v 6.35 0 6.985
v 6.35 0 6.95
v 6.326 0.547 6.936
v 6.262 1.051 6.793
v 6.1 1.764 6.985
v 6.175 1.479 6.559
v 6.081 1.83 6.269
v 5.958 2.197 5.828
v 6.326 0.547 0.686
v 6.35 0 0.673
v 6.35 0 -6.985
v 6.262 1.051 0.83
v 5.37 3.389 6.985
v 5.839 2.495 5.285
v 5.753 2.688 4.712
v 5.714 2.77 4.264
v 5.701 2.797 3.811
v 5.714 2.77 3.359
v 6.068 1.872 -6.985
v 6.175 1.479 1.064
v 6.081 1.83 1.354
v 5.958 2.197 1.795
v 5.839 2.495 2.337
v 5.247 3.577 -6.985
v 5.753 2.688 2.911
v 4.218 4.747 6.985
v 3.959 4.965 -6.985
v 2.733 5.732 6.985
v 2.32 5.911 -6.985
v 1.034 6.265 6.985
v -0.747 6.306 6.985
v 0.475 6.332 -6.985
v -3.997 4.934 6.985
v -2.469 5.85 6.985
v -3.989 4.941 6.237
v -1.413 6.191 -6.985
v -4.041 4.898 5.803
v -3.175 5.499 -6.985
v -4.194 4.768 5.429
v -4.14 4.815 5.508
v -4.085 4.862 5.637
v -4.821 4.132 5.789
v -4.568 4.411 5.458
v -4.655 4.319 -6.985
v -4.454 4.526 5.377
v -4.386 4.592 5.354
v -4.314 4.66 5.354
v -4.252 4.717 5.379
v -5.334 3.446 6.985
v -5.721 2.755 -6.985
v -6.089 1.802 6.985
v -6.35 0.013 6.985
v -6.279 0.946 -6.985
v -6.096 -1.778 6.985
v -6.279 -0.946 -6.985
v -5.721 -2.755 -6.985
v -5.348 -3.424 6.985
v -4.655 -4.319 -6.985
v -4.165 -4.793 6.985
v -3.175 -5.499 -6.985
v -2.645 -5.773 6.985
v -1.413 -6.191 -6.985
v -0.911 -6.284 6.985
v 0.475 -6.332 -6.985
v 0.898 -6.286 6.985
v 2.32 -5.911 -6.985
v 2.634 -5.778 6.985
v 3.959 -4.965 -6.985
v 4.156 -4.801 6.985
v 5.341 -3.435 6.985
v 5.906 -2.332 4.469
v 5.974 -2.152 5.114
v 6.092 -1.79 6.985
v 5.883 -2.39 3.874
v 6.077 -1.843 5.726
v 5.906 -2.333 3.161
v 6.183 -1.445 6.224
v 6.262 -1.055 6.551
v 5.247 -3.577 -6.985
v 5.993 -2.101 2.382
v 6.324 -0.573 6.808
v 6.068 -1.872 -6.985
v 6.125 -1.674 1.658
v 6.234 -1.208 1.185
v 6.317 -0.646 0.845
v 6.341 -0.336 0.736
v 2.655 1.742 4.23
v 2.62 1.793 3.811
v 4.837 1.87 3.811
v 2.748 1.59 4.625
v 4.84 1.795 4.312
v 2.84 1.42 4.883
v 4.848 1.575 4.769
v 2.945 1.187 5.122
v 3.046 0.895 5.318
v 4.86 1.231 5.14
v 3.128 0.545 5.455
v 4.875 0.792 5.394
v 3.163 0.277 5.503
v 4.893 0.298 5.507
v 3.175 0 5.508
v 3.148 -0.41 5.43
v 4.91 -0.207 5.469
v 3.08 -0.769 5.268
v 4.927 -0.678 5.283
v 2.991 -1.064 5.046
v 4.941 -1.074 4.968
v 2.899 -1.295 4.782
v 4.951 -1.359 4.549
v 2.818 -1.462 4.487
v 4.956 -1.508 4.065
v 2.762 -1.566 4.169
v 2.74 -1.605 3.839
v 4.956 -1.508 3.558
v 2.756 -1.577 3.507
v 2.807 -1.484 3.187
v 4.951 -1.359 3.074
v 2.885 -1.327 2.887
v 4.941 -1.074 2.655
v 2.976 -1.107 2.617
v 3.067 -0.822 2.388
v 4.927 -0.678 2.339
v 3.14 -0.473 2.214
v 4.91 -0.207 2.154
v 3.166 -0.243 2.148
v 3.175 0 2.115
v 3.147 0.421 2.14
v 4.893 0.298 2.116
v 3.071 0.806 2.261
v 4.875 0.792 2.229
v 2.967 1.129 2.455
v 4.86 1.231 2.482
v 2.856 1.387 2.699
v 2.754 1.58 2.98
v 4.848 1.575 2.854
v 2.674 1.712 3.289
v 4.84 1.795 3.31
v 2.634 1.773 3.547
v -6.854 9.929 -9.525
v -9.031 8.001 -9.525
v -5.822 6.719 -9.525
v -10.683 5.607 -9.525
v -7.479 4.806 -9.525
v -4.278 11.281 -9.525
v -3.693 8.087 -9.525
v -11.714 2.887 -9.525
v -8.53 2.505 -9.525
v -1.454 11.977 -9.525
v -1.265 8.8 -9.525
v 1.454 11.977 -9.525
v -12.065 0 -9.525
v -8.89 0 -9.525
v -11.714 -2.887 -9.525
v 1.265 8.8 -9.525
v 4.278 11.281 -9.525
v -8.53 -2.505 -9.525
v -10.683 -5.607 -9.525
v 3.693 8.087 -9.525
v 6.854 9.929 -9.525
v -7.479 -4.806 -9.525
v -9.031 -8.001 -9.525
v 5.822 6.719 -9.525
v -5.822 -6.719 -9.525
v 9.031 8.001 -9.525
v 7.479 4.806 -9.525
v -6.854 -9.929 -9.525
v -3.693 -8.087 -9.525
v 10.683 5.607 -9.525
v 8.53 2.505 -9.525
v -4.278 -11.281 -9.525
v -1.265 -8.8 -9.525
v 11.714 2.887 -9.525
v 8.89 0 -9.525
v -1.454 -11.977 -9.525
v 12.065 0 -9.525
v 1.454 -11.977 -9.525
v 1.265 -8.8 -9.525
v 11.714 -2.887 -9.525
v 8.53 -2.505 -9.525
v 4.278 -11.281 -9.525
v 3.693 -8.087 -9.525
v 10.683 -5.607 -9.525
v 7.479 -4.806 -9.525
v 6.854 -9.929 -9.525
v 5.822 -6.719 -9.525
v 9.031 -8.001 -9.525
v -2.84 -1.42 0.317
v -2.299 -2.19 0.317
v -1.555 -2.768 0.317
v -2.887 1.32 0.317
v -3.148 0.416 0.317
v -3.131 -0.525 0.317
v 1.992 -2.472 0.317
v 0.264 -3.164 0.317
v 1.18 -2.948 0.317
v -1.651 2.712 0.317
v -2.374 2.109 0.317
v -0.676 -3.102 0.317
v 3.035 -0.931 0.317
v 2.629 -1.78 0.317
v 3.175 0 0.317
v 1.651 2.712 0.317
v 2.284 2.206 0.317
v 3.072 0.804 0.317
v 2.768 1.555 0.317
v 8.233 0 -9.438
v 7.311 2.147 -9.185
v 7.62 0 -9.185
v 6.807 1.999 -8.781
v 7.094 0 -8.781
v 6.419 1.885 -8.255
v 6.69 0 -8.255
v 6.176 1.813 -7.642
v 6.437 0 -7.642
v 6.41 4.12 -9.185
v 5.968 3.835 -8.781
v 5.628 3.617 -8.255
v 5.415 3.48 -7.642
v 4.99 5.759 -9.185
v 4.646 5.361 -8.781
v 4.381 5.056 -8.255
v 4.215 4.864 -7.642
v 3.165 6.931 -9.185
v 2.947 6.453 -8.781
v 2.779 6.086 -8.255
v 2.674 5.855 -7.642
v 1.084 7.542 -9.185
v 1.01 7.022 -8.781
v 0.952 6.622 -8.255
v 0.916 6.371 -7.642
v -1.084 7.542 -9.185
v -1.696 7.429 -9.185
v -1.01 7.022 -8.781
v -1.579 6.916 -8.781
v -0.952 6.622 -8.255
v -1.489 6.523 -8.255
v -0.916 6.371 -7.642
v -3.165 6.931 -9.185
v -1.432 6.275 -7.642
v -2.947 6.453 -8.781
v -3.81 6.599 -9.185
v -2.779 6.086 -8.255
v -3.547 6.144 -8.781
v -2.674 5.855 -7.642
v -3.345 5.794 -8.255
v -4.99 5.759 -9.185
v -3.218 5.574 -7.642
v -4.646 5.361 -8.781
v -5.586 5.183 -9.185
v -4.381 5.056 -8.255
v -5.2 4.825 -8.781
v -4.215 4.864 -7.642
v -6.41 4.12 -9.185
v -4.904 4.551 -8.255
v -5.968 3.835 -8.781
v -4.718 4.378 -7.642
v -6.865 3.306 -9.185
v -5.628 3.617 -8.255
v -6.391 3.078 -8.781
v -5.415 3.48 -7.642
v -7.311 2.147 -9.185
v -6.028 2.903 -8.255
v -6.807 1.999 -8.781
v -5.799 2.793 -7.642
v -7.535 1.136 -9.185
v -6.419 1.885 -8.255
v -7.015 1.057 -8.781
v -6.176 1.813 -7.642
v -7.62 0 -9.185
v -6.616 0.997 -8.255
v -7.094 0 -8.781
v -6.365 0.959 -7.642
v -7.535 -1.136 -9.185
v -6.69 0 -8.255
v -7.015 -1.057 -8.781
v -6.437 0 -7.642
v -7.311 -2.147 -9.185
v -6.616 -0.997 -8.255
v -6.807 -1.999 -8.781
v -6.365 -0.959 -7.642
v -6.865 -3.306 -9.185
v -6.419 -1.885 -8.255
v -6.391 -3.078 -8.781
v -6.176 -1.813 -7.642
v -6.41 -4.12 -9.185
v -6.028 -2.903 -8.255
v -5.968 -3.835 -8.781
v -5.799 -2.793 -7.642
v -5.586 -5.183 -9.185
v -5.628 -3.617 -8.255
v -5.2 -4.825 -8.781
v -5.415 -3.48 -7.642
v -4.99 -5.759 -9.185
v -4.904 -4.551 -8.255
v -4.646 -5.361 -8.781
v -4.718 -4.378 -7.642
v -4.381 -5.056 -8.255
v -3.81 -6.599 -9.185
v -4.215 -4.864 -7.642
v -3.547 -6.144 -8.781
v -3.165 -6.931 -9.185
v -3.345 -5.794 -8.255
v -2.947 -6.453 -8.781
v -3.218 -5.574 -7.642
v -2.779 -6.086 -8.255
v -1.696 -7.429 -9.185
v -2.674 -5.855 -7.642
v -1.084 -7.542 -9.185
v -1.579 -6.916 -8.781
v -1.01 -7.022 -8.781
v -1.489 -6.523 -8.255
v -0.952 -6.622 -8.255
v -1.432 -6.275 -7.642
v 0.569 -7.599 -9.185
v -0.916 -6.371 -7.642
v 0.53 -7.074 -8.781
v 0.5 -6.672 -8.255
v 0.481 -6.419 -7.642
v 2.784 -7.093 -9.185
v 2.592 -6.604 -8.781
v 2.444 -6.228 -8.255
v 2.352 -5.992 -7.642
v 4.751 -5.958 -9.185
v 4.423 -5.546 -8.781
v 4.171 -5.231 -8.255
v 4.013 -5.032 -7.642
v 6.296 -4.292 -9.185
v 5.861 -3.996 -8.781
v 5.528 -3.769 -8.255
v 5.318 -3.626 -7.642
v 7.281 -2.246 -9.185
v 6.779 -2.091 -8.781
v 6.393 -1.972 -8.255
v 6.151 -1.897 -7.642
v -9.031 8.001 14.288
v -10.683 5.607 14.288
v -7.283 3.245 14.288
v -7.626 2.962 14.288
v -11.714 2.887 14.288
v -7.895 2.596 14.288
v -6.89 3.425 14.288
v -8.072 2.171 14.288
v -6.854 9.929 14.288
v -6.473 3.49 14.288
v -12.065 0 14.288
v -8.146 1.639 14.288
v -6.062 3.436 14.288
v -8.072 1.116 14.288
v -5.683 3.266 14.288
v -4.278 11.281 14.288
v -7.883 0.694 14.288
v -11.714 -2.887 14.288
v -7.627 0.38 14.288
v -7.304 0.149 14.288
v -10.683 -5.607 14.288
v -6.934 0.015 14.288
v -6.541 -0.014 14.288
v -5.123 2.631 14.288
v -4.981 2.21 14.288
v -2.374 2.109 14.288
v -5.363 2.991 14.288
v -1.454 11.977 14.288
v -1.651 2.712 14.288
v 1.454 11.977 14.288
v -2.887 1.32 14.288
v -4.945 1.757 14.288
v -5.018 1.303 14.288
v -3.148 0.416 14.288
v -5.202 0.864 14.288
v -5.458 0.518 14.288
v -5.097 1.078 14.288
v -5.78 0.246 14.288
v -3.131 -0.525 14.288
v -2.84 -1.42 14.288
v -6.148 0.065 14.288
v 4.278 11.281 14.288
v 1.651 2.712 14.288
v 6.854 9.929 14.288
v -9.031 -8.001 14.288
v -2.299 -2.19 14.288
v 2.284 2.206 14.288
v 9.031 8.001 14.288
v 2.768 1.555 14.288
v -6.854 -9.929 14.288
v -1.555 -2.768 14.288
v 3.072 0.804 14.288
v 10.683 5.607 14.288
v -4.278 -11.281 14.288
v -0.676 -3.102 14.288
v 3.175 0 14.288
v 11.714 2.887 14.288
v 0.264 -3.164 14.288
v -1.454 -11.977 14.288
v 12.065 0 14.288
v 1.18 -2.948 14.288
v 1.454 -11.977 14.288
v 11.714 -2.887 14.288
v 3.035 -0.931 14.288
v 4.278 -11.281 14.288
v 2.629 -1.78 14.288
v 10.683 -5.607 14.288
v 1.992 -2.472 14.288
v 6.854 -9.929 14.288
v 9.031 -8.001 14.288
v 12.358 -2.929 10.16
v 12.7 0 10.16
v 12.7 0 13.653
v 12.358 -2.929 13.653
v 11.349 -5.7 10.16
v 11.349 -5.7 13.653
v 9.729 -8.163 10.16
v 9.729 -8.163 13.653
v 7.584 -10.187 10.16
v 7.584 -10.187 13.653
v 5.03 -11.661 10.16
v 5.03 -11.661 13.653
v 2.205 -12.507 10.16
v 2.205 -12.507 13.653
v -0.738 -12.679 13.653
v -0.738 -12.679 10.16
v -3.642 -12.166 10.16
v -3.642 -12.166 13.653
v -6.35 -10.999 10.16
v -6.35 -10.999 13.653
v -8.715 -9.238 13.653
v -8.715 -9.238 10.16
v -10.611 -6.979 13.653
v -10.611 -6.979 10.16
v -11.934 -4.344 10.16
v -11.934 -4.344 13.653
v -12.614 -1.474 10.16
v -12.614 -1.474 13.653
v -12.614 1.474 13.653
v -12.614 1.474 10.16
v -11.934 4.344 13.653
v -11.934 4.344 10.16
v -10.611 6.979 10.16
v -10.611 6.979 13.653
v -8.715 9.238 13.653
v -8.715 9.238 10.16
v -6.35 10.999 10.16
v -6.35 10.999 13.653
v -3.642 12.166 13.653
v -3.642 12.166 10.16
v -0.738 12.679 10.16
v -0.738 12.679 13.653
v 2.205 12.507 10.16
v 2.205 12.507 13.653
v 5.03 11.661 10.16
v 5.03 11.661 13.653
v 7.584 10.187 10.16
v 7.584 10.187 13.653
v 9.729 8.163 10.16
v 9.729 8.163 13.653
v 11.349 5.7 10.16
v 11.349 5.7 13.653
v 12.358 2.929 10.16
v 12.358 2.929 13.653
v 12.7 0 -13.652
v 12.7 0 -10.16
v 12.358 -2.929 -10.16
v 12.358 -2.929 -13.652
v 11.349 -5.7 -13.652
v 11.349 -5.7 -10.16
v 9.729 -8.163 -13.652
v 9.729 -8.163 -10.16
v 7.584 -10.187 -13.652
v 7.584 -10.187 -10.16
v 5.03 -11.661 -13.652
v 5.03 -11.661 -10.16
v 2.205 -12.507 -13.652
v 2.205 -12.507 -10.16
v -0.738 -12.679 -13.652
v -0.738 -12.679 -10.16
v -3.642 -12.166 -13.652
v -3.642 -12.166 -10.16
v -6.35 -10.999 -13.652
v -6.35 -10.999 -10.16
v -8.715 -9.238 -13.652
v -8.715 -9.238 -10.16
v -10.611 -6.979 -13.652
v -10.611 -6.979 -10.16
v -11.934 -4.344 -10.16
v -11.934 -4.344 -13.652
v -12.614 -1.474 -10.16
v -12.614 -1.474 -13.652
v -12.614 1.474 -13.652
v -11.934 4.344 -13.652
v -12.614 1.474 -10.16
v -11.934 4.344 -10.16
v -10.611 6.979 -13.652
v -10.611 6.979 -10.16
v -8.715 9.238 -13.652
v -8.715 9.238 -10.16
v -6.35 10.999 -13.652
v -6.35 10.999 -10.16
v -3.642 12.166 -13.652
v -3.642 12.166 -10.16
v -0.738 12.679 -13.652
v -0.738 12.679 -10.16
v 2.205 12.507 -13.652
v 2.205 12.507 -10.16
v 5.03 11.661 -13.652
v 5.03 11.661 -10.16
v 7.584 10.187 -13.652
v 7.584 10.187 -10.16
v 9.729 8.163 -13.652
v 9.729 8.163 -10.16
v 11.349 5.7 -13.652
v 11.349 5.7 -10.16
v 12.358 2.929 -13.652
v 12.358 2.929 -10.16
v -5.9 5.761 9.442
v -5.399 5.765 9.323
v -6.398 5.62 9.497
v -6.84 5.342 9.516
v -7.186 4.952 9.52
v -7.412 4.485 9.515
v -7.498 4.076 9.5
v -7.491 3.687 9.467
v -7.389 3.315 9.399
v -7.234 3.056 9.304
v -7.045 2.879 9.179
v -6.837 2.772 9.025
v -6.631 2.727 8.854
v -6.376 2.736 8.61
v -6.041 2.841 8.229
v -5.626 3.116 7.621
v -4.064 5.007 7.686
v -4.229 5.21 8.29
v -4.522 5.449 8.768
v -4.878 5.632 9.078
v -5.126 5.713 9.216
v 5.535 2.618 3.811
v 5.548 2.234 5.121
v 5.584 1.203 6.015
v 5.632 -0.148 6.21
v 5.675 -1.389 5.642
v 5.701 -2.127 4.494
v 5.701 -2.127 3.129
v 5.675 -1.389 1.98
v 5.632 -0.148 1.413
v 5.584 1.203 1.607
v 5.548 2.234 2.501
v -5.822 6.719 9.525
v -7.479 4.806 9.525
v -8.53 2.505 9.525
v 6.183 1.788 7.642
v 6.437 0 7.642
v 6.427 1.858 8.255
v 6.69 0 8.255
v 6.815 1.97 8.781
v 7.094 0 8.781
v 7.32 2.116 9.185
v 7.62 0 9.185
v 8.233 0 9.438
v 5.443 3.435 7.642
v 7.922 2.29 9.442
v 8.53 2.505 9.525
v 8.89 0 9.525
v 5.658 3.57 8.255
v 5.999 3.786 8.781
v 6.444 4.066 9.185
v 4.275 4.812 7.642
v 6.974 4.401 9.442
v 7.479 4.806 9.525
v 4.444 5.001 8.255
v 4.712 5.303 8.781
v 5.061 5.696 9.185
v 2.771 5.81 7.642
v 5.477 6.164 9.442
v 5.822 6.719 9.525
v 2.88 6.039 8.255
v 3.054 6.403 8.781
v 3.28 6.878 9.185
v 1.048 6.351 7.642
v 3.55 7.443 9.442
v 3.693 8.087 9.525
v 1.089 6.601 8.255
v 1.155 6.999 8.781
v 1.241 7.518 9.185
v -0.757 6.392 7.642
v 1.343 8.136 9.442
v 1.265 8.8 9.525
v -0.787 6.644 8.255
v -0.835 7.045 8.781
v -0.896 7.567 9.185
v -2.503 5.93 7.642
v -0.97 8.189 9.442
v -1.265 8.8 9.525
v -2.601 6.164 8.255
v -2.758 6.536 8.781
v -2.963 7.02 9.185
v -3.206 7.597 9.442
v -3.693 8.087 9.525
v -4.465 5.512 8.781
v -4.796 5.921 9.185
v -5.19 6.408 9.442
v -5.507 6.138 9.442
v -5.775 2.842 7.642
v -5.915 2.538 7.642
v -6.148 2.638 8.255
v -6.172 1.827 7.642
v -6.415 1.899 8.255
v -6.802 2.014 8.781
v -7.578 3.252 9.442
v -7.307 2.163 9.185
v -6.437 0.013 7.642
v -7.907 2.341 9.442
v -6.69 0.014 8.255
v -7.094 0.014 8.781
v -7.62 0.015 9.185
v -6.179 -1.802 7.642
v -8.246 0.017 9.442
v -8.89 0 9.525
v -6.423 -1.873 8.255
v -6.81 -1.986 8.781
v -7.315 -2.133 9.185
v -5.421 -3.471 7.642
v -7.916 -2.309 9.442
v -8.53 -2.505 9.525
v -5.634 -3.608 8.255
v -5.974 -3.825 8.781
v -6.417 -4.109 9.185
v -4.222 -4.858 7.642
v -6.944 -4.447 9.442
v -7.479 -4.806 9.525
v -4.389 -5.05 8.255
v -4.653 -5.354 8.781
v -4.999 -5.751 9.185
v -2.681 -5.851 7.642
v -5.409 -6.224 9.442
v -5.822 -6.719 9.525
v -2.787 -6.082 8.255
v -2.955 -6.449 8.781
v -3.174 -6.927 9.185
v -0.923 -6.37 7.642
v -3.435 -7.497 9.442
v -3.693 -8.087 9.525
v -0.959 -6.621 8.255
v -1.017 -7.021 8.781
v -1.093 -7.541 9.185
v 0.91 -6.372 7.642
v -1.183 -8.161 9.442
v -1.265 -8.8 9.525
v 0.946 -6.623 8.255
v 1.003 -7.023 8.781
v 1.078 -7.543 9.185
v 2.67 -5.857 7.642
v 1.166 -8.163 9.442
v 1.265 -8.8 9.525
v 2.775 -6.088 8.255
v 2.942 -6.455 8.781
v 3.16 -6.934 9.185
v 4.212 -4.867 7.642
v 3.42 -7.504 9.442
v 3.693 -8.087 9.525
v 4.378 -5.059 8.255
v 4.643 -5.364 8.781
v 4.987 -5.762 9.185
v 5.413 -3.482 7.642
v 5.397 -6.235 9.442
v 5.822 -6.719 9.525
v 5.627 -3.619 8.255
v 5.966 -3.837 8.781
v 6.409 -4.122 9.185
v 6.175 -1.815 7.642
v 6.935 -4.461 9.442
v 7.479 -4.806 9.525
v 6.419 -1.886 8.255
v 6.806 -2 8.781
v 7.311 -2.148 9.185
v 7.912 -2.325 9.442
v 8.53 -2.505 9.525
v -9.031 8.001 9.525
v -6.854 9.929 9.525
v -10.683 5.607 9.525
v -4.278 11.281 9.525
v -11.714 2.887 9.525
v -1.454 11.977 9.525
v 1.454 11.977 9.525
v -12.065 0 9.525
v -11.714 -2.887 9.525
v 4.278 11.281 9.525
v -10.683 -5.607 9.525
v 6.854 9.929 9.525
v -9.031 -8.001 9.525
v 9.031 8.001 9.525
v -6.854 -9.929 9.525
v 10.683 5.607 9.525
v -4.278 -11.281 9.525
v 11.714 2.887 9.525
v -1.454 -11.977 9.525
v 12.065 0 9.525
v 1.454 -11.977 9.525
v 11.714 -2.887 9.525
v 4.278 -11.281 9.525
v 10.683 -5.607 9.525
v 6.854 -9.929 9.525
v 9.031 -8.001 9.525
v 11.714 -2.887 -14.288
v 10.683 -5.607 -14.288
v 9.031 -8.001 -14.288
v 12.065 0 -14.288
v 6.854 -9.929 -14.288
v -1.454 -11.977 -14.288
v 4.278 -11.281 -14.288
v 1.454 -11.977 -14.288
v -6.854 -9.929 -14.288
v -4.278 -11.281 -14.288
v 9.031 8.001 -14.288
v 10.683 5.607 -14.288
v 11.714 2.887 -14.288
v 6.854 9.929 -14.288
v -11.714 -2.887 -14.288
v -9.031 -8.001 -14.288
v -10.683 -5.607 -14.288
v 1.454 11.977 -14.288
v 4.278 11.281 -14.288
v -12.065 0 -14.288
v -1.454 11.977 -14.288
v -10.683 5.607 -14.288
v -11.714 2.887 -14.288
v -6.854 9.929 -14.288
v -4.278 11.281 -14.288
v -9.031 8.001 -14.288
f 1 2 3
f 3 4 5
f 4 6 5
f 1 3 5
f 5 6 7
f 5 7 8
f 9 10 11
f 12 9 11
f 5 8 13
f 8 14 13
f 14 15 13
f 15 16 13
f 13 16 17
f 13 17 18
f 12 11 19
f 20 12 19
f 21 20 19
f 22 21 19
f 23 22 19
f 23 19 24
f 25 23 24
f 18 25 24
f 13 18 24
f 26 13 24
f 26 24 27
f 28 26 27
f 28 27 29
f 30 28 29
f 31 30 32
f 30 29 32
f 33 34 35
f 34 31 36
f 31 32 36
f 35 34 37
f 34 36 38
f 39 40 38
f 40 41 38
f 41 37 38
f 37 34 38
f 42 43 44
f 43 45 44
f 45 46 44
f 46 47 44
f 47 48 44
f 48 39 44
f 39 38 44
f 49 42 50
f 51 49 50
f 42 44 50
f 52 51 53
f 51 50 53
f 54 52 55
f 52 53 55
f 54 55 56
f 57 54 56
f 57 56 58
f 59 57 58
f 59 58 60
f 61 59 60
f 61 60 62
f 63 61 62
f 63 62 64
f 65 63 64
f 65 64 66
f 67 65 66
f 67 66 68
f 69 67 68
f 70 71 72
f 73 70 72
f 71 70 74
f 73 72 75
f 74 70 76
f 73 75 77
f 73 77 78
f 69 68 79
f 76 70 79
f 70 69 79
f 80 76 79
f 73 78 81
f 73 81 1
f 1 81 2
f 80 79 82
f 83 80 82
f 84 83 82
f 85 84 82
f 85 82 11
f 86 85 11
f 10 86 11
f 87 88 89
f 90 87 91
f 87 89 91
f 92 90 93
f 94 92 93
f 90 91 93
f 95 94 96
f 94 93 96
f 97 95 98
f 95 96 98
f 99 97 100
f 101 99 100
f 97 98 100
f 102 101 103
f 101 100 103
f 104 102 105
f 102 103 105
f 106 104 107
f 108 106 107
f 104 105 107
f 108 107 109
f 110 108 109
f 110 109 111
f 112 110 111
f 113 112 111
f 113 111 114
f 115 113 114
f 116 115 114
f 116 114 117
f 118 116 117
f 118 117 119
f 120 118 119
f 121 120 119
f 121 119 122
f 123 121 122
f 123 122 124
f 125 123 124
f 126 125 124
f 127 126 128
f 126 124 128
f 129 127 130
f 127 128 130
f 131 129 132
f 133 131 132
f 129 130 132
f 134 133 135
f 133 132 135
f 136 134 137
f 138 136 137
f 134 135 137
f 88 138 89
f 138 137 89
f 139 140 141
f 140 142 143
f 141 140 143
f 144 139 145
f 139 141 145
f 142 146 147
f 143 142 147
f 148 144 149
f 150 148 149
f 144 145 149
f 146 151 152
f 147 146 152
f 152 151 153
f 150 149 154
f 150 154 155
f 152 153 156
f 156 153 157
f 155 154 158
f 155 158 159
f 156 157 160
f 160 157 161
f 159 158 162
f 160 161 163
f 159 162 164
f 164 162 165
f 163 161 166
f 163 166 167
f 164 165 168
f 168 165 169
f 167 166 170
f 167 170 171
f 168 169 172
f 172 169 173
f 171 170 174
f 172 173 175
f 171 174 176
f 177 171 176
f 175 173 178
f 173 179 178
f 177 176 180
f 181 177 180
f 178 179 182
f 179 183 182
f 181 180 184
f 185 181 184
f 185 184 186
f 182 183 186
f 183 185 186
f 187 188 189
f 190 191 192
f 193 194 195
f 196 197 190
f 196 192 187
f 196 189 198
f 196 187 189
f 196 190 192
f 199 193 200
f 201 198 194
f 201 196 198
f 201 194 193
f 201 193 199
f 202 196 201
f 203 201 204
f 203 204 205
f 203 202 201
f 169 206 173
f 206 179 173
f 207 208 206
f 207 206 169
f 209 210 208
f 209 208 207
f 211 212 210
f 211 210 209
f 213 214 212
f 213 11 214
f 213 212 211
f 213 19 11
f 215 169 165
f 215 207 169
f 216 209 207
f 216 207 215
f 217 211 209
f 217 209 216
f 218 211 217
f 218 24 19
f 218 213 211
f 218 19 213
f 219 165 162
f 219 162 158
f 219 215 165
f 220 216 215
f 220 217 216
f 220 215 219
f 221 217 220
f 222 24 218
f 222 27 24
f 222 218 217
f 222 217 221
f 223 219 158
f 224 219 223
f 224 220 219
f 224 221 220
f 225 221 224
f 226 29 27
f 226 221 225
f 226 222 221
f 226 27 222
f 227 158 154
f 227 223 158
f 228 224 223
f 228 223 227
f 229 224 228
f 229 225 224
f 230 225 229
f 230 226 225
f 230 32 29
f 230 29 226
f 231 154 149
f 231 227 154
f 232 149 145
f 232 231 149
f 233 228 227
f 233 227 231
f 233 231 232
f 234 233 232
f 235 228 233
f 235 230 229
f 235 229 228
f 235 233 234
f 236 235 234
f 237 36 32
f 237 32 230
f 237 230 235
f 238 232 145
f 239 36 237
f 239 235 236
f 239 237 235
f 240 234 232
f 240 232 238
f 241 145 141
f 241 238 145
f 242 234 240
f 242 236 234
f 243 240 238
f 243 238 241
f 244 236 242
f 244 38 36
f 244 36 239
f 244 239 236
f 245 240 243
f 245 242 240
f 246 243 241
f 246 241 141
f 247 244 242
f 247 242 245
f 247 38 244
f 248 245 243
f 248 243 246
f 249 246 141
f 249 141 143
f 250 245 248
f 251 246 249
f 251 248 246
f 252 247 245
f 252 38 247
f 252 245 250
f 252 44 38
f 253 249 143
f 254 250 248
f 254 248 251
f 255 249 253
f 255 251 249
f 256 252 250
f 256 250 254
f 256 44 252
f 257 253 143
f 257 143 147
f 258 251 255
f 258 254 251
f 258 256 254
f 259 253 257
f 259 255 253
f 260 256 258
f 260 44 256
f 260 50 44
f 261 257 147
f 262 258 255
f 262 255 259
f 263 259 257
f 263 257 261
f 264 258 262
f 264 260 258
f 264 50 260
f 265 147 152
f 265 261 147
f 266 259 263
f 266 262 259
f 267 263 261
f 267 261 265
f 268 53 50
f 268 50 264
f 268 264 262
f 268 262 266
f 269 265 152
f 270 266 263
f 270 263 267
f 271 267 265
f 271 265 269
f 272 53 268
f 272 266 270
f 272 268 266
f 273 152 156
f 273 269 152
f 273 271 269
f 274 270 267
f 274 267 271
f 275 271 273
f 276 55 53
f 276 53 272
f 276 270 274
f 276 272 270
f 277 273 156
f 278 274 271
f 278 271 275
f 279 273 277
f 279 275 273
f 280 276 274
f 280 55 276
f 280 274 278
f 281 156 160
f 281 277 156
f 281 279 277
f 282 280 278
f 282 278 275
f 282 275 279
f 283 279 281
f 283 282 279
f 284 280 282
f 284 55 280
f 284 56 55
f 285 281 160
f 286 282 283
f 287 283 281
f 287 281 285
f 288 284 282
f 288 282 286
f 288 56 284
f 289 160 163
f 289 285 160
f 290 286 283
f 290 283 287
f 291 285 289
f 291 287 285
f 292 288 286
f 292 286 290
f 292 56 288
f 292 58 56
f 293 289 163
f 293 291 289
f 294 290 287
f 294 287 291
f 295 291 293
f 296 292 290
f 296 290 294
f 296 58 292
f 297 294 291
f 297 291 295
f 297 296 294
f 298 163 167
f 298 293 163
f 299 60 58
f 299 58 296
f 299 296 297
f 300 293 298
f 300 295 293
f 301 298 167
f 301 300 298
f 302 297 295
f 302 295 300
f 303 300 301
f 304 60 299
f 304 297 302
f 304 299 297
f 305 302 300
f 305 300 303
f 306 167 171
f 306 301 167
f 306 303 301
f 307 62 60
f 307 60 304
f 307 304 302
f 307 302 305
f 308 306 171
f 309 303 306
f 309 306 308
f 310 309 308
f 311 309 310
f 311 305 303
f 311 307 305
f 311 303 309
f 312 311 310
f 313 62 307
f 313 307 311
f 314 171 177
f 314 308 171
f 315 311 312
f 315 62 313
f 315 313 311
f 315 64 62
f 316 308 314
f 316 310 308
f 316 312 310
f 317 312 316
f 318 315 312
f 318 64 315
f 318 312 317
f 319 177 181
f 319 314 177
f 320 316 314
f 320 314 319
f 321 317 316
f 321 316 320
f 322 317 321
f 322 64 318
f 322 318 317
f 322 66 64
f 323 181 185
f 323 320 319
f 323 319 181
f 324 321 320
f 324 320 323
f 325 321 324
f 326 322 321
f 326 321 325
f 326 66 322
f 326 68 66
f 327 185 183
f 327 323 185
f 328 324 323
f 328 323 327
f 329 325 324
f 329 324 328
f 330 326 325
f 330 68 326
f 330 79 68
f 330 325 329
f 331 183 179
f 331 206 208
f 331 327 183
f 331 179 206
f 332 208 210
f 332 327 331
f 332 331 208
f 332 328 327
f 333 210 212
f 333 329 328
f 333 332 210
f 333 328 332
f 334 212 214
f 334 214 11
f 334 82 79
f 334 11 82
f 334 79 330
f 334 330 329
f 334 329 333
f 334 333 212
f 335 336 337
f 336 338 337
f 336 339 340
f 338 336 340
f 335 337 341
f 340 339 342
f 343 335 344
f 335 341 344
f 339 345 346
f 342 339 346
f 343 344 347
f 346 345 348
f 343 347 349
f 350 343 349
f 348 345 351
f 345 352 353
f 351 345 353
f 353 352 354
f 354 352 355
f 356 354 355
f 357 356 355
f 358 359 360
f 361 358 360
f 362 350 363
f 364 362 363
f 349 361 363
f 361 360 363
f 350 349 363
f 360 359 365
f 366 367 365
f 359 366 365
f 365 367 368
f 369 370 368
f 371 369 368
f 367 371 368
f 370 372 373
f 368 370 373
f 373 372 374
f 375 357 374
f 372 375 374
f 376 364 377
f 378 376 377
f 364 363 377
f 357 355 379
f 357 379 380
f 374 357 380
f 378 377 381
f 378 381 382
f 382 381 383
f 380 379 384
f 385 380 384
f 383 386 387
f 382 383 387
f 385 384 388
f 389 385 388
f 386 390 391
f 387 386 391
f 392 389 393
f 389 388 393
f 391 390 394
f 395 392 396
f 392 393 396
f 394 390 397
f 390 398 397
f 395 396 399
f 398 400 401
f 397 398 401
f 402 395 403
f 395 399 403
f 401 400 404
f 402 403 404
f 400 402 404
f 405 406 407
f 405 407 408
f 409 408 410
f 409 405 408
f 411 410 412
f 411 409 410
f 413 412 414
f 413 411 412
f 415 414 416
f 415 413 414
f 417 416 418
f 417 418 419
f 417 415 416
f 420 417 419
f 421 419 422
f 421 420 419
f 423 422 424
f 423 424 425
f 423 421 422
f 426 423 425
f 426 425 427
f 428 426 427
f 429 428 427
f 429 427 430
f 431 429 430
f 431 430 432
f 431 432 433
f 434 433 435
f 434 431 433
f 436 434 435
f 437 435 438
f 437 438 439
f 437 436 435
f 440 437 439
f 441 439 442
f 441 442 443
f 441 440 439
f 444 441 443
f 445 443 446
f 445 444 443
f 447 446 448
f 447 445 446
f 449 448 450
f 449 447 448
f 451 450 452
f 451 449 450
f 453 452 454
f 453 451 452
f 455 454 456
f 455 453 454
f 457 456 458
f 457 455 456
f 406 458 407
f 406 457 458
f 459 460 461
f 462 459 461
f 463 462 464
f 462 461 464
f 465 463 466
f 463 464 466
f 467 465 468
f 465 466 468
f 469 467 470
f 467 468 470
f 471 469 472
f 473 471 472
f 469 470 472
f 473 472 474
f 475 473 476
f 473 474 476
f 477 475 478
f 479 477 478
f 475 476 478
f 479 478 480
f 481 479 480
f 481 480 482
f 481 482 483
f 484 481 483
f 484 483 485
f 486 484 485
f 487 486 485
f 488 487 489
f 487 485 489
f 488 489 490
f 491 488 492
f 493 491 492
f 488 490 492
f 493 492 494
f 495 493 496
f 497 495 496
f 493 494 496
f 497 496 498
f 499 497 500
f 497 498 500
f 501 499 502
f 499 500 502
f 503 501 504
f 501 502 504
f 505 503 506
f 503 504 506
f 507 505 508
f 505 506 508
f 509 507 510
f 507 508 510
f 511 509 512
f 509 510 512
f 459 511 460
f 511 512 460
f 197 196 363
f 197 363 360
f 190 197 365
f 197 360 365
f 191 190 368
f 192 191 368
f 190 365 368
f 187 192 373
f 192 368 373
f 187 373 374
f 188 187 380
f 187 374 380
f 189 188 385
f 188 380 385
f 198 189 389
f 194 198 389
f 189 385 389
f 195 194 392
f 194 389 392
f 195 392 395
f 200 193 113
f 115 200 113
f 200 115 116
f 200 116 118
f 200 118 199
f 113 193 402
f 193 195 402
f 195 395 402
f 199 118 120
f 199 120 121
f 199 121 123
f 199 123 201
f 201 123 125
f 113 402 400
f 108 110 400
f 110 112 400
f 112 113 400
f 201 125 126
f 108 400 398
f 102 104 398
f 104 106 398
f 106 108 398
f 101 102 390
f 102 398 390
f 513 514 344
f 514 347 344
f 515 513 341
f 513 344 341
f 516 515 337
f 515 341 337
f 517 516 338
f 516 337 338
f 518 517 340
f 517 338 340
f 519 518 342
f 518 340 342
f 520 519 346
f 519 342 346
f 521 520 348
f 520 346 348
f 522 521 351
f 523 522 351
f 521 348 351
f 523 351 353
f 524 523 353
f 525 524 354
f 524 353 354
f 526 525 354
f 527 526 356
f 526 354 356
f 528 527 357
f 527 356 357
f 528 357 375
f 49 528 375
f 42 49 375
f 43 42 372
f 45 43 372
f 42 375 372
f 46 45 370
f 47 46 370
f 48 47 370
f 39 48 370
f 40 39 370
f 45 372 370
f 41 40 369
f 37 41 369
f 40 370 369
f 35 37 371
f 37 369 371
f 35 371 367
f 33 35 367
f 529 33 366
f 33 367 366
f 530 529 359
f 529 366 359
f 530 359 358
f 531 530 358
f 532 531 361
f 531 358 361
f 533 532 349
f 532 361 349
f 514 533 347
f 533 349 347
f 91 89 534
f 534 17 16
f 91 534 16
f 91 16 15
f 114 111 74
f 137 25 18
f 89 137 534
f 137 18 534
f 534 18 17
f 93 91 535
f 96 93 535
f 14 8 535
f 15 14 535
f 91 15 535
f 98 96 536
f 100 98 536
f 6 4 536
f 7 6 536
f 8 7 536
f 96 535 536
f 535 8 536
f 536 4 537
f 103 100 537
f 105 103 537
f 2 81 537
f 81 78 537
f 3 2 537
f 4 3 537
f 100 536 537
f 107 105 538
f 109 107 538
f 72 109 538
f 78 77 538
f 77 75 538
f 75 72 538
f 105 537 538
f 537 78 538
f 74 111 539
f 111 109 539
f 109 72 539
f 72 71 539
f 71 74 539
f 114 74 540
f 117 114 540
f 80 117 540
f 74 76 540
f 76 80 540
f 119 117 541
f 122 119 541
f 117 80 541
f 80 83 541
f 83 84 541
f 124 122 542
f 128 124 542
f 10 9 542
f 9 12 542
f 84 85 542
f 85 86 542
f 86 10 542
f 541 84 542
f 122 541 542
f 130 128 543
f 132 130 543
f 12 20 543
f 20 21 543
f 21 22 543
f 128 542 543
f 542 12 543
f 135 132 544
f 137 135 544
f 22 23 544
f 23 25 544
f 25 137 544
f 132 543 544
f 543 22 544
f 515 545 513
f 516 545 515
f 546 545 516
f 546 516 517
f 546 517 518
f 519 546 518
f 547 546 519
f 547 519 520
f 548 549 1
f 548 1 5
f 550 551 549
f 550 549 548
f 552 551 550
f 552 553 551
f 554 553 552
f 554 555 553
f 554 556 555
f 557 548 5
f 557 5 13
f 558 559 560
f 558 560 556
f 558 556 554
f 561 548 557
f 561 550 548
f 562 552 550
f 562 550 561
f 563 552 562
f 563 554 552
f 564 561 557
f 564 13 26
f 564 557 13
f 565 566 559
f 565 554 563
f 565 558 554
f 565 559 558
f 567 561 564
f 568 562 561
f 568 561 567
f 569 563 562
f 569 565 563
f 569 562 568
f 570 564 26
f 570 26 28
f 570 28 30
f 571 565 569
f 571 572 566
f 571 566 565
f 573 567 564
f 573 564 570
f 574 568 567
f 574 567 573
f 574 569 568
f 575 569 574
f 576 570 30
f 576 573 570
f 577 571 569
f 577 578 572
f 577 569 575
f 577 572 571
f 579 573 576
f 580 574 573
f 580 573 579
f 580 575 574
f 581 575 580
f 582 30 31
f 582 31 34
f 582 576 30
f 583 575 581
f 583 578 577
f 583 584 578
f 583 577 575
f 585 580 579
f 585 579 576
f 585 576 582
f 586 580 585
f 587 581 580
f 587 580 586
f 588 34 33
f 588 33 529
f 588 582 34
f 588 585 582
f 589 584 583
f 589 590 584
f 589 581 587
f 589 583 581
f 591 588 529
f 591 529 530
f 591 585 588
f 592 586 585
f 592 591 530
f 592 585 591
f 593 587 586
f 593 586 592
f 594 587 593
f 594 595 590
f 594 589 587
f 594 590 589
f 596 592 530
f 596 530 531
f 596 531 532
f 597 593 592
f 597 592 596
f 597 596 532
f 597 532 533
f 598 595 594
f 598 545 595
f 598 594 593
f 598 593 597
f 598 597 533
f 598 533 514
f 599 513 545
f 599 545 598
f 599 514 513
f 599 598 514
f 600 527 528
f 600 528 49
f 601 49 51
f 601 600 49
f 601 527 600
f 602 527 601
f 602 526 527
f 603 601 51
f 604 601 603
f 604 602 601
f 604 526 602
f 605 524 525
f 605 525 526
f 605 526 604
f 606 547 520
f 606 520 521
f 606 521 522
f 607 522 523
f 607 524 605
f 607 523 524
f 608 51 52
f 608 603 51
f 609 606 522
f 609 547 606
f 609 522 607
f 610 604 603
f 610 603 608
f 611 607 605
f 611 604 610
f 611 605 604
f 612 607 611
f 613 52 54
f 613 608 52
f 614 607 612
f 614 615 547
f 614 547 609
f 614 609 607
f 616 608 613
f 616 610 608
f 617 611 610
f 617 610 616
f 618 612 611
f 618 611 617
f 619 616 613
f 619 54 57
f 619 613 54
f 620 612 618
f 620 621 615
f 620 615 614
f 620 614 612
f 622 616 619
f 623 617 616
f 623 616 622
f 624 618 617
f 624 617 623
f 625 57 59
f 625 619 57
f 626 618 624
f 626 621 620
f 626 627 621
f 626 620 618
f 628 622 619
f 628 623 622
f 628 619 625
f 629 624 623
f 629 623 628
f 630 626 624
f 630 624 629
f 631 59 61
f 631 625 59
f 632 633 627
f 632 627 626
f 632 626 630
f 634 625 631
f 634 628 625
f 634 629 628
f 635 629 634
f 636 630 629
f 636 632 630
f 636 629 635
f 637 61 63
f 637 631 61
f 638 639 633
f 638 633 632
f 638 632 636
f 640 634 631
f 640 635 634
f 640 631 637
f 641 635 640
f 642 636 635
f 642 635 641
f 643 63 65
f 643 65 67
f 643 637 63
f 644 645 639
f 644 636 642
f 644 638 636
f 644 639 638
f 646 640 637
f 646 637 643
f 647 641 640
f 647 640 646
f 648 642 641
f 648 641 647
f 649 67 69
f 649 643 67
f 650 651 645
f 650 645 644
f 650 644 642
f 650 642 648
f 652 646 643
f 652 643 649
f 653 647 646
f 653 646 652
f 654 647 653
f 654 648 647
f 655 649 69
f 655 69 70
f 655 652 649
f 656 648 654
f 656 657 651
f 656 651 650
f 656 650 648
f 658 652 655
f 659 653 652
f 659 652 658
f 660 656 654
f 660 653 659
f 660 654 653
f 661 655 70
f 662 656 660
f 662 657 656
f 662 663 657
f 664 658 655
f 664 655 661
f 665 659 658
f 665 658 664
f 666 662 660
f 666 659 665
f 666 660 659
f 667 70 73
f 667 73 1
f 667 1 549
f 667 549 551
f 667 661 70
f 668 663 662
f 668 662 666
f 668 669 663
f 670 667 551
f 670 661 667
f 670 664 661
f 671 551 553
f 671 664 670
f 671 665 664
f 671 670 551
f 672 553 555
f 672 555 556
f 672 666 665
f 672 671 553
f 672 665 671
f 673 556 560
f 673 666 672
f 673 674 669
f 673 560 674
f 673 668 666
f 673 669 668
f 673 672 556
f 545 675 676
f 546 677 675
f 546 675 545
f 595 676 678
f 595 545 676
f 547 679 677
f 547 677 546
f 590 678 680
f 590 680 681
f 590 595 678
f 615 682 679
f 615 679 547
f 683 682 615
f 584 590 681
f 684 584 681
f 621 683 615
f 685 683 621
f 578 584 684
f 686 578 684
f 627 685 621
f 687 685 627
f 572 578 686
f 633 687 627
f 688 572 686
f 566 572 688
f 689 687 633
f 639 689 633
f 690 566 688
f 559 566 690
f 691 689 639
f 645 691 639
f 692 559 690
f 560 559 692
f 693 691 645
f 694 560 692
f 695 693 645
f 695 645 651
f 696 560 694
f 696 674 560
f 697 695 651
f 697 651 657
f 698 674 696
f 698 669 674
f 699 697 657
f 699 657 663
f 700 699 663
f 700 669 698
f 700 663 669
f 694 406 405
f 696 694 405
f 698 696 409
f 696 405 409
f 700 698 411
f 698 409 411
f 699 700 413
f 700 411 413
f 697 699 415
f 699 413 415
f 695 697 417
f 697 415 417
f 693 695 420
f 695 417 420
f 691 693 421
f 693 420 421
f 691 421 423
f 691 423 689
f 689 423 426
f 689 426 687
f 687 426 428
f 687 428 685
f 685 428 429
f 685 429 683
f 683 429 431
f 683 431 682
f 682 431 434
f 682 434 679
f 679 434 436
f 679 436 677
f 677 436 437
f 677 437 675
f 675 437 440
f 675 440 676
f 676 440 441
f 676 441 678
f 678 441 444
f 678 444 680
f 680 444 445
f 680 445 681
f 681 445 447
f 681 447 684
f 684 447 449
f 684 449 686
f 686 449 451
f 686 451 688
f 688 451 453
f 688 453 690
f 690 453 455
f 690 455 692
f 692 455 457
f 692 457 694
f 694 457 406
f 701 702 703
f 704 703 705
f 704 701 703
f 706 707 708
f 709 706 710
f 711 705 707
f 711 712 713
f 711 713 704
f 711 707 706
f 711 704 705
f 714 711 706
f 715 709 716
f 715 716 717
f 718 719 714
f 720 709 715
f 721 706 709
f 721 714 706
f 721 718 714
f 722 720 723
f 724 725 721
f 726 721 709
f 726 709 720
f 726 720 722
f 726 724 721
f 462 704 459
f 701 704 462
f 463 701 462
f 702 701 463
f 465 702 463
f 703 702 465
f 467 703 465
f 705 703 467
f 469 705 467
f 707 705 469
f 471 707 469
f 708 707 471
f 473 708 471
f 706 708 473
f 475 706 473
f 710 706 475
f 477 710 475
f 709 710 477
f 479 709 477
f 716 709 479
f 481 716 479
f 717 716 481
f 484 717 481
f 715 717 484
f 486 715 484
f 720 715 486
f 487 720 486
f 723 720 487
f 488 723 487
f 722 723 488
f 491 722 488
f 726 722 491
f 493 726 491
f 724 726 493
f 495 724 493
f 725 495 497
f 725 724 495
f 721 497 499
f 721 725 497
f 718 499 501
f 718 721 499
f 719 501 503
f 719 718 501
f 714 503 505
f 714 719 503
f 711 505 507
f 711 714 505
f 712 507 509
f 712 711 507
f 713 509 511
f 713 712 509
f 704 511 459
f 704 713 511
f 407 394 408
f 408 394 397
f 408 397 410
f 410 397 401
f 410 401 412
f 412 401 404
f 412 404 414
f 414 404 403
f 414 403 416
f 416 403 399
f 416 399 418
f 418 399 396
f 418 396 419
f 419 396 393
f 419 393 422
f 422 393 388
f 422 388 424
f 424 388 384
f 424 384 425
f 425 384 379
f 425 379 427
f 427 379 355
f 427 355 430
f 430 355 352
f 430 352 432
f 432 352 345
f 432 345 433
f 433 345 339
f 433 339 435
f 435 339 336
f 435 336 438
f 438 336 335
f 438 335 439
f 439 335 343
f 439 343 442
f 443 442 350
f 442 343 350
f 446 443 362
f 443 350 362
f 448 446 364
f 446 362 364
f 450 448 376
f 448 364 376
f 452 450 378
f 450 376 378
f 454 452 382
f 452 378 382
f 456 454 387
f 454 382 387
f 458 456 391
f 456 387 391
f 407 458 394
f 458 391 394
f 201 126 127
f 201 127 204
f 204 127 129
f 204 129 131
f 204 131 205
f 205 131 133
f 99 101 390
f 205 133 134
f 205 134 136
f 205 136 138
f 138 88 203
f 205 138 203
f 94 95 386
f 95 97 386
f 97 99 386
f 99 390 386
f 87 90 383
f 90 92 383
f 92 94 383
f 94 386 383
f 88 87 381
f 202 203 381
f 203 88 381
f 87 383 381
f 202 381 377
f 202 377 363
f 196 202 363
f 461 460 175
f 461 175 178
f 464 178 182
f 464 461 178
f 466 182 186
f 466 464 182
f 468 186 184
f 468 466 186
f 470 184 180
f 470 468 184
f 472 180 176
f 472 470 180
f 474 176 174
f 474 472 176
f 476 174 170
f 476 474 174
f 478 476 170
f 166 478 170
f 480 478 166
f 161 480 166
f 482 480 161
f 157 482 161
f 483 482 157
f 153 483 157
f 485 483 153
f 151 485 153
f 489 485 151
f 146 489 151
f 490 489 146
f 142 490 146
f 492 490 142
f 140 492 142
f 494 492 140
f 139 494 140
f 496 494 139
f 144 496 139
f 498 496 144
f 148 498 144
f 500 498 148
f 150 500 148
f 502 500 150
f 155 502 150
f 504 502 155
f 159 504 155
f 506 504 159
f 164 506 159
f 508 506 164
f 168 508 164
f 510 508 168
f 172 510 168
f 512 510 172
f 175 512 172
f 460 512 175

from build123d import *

# Parameters (mm, degrees)
BOSS_EXTRUDE1_DEPTH            = 9.525
BOSS_EXTRUDE1_DEPTH_BACK       = 9.525
SKETCH1_R                      = 6.35
SKETCH1_R_2                    = 3.175
SKETCH2_R                      = 12.7
SKETCH2_R_2                    = 6.35
SKETCH2_R_3                    = 3.175
BOSS_EXTRUDE3_DEPTH            = 4.7625
SKETCH3_R                      = 3.175
BOSS_EXTRUDE4_DEPTH            = 28.575
FILLET1_R                      = 2.54
CHAMFER1_SIZE                  = 0.635
CUT_EXTRUDE1_DEPTH             = 13.97
CUT_EXTRUDE2_REACH             = 39.354
SKETCH6_R                      = 1.5875
CUT_EXTRUDE2_DIRECTION_2_REACH = 39.354


# Read off the part's stored shape, not the designer's step: CSK for M3 Flat Head Machine Screw1
with BuildPart() as part:
    # Sketch1 → Boss-Extrude1 (new, two sides: drawn at the far end of the back side and taken through both)
    with BuildSketch(Plane.XY.offset(-BOSS_EXTRUDE1_DEPTH_BACK)):
        Circle(SKETCH1_R)
        Circle(SKETCH1_R_2, mode=Mode.SUBTRACT)
    extrude(amount=BOSS_EXTRUDE1_DEPTH + BOSS_EXTRUDE1_DEPTH_BACK)

    # Sketch2 → Boss-Extrude3 (add)
    # profile 1 of 2: a face of its own
    with BuildSketch(Plane(origin=(0, 0, -9.525), x_dir=(-1, 0, 0), z_dir=(0, 0, -1))):
        with Locations(Location((0, 0, 0), (0, 0, 180))):
            Circle(SKETCH2_R)
        with Locations(Location((0, 0, 0), (0, 0, 180))):
            Circle(SKETCH2_R_2, mode=Mode.SUBTRACT)
    # profile 2 of 2: a face of its own
    with BuildSketch(Plane(origin=(0, 0, -9.525), x_dir=(-1, 0, 0), z_dir=(0, 0, -1))):
        with Locations(Location((0, 0, 0), (0, 0, 180))):
            Circle(SKETCH2_R_2)
        with Locations(Location((0, 0, 0), (0, 0, 180))):
            Circle(SKETCH2_R_3, mode=Mode.SUBTRACT)
    boss_extrude3 = extrude(amount=BOSS_EXTRUDE3_DEPTH)

    # Mirror1: Boss-Extrude3 across plane
    add(boss_extrude3.mirror(Plane.XY))

    # Sketch3 → Boss-Extrude4 (add, through all)
    with BuildSketch(Plane(origin=(0, 0, -14.2875), x_dir=(-1, 0, 0), z_dir=(0, 0, -1))):
        Circle(SKETCH3_R)
    extrude(amount=-BOSS_EXTRUDE4_DEPTH)

    # Fillet1
    fillet1_edges = [part.edges().sort_by_distance(p)[0] for p in [
        (-6.35, 0, -9.525),
        (-6.35, 0, 9.525),
    ]]
    fillet(fillet1_edges, radius=FILLET1_R)

    # Chamfer1
    chamfer1_edges = [part.edges().sort_by_distance(p)[0] for p in [
        (-12.7, 0, -9.525),
        (-12.7, 0, -14.2875),
        (-12.7, 0, 14.2875),
        (-12.7, 0, 9.525),
    ]]
    chamfer(chamfer1_edges, length=CHAMFER1_SIZE)

    # Sketch4 → Cut-Extrude1 (cut)
    with BuildSketch(Plane.XY.offset(14.2875)):
        with BuildLine():
            Line((1.651, 2.711977876), (-1.651, 2.711977876))
            ThreePointArc((-1.651, 2.711977876), (-1.555425987, -2.767900829), (3.175, 0))
            ThreePointArc((3.175, 0), (2.767900829, 1.555425987), (1.651, 2.711977876))
        make_face()
    extrude(amount=-CUT_EXTRUDE1_DEPTH, mode=Mode.SUBTRACT)

    # Sketch6 → Cut-Extrude2 (cut, up to next)
    with BuildSketch(Plane(origin=(-6.544693312, 1.737013471, 14.2875), x_dir=(0.9927863104442903, -0.05092138559106857, 0.1085465535330304), z_dir=(-0.11989721345558171, -0.4216449495917331, 0.8987993072368112)), mode=Mode.PRIVATE) as cut_extrude2_sk1:
        with Locations(Location((0, 0, 0), (0, 0, 75.6633116))):
            Circle(SKETCH6_R)
    cut_extrude2_tool1 = extrude(cut_extrude2_sk1.sketch, amount=-CUT_EXTRUDE2_REACH, mode=Mode.PRIVATE) & part.part
    add(cut_extrude2_tool1.solids().sort_by_distance((-6.544693, 1.737013, 14.2875))[0], mode=Mode.SUBTRACT)

    # Sketch6 → Cut-Extrude2 direction 2 (cut, up to next)
    with BuildSketch(Plane(origin=(-6.544693312, 1.737013471, 14.2875), x_dir=(0.9927863104442903, -0.05092138559106857, 0.1085465535330304), z_dir=(-0.11989721345558171, -0.4216449495917331, 0.8987993072368112)), mode=Mode.PRIVATE) as cut_extrude2_direction_2_sk1:
        with Locations(Location((0, 0, 0), (0, 0, 75.6633116))):
            Circle(SKETCH6_R)
    cut_extrude2_direction_2_tool1 = extrude(cut_extrude2_direction_2_sk1.sketch, amount=CUT_EXTRUDE2_DIRECTION_2_REACH, mode=Mode.PRIVATE) & part.part
    add(cut_extrude2_direction_2_tool1.solids().sort_by_distance((-6.544693, 1.737013, 14.2875))[0], mode=Mode.SUBTRACT)

    # CSK for M3 Flat Head Machine Screw1 outl → CSK for M3 Flat Head Machine Screw1 (revolve, cut)
    with BuildSketch(Plane(origin=(0, 0, 3.811254633), x_dir=(-0.0350043317696159, 0.9993871605926117, 0), z_dir=(0, 0, -1))):
        Polygon((0, 2.681318057), (1.7, 2.681318057), (1.7, 4.9), (3.150097206, 6.350097206), (0, 6.350097206), align=None)
    revolve(axis=Axis((0, 0, 3.811254633), (0.9993871605926117, 0.0350043317696159, 0)), mode=Mode.SUBTRACT)


solid = part.part
